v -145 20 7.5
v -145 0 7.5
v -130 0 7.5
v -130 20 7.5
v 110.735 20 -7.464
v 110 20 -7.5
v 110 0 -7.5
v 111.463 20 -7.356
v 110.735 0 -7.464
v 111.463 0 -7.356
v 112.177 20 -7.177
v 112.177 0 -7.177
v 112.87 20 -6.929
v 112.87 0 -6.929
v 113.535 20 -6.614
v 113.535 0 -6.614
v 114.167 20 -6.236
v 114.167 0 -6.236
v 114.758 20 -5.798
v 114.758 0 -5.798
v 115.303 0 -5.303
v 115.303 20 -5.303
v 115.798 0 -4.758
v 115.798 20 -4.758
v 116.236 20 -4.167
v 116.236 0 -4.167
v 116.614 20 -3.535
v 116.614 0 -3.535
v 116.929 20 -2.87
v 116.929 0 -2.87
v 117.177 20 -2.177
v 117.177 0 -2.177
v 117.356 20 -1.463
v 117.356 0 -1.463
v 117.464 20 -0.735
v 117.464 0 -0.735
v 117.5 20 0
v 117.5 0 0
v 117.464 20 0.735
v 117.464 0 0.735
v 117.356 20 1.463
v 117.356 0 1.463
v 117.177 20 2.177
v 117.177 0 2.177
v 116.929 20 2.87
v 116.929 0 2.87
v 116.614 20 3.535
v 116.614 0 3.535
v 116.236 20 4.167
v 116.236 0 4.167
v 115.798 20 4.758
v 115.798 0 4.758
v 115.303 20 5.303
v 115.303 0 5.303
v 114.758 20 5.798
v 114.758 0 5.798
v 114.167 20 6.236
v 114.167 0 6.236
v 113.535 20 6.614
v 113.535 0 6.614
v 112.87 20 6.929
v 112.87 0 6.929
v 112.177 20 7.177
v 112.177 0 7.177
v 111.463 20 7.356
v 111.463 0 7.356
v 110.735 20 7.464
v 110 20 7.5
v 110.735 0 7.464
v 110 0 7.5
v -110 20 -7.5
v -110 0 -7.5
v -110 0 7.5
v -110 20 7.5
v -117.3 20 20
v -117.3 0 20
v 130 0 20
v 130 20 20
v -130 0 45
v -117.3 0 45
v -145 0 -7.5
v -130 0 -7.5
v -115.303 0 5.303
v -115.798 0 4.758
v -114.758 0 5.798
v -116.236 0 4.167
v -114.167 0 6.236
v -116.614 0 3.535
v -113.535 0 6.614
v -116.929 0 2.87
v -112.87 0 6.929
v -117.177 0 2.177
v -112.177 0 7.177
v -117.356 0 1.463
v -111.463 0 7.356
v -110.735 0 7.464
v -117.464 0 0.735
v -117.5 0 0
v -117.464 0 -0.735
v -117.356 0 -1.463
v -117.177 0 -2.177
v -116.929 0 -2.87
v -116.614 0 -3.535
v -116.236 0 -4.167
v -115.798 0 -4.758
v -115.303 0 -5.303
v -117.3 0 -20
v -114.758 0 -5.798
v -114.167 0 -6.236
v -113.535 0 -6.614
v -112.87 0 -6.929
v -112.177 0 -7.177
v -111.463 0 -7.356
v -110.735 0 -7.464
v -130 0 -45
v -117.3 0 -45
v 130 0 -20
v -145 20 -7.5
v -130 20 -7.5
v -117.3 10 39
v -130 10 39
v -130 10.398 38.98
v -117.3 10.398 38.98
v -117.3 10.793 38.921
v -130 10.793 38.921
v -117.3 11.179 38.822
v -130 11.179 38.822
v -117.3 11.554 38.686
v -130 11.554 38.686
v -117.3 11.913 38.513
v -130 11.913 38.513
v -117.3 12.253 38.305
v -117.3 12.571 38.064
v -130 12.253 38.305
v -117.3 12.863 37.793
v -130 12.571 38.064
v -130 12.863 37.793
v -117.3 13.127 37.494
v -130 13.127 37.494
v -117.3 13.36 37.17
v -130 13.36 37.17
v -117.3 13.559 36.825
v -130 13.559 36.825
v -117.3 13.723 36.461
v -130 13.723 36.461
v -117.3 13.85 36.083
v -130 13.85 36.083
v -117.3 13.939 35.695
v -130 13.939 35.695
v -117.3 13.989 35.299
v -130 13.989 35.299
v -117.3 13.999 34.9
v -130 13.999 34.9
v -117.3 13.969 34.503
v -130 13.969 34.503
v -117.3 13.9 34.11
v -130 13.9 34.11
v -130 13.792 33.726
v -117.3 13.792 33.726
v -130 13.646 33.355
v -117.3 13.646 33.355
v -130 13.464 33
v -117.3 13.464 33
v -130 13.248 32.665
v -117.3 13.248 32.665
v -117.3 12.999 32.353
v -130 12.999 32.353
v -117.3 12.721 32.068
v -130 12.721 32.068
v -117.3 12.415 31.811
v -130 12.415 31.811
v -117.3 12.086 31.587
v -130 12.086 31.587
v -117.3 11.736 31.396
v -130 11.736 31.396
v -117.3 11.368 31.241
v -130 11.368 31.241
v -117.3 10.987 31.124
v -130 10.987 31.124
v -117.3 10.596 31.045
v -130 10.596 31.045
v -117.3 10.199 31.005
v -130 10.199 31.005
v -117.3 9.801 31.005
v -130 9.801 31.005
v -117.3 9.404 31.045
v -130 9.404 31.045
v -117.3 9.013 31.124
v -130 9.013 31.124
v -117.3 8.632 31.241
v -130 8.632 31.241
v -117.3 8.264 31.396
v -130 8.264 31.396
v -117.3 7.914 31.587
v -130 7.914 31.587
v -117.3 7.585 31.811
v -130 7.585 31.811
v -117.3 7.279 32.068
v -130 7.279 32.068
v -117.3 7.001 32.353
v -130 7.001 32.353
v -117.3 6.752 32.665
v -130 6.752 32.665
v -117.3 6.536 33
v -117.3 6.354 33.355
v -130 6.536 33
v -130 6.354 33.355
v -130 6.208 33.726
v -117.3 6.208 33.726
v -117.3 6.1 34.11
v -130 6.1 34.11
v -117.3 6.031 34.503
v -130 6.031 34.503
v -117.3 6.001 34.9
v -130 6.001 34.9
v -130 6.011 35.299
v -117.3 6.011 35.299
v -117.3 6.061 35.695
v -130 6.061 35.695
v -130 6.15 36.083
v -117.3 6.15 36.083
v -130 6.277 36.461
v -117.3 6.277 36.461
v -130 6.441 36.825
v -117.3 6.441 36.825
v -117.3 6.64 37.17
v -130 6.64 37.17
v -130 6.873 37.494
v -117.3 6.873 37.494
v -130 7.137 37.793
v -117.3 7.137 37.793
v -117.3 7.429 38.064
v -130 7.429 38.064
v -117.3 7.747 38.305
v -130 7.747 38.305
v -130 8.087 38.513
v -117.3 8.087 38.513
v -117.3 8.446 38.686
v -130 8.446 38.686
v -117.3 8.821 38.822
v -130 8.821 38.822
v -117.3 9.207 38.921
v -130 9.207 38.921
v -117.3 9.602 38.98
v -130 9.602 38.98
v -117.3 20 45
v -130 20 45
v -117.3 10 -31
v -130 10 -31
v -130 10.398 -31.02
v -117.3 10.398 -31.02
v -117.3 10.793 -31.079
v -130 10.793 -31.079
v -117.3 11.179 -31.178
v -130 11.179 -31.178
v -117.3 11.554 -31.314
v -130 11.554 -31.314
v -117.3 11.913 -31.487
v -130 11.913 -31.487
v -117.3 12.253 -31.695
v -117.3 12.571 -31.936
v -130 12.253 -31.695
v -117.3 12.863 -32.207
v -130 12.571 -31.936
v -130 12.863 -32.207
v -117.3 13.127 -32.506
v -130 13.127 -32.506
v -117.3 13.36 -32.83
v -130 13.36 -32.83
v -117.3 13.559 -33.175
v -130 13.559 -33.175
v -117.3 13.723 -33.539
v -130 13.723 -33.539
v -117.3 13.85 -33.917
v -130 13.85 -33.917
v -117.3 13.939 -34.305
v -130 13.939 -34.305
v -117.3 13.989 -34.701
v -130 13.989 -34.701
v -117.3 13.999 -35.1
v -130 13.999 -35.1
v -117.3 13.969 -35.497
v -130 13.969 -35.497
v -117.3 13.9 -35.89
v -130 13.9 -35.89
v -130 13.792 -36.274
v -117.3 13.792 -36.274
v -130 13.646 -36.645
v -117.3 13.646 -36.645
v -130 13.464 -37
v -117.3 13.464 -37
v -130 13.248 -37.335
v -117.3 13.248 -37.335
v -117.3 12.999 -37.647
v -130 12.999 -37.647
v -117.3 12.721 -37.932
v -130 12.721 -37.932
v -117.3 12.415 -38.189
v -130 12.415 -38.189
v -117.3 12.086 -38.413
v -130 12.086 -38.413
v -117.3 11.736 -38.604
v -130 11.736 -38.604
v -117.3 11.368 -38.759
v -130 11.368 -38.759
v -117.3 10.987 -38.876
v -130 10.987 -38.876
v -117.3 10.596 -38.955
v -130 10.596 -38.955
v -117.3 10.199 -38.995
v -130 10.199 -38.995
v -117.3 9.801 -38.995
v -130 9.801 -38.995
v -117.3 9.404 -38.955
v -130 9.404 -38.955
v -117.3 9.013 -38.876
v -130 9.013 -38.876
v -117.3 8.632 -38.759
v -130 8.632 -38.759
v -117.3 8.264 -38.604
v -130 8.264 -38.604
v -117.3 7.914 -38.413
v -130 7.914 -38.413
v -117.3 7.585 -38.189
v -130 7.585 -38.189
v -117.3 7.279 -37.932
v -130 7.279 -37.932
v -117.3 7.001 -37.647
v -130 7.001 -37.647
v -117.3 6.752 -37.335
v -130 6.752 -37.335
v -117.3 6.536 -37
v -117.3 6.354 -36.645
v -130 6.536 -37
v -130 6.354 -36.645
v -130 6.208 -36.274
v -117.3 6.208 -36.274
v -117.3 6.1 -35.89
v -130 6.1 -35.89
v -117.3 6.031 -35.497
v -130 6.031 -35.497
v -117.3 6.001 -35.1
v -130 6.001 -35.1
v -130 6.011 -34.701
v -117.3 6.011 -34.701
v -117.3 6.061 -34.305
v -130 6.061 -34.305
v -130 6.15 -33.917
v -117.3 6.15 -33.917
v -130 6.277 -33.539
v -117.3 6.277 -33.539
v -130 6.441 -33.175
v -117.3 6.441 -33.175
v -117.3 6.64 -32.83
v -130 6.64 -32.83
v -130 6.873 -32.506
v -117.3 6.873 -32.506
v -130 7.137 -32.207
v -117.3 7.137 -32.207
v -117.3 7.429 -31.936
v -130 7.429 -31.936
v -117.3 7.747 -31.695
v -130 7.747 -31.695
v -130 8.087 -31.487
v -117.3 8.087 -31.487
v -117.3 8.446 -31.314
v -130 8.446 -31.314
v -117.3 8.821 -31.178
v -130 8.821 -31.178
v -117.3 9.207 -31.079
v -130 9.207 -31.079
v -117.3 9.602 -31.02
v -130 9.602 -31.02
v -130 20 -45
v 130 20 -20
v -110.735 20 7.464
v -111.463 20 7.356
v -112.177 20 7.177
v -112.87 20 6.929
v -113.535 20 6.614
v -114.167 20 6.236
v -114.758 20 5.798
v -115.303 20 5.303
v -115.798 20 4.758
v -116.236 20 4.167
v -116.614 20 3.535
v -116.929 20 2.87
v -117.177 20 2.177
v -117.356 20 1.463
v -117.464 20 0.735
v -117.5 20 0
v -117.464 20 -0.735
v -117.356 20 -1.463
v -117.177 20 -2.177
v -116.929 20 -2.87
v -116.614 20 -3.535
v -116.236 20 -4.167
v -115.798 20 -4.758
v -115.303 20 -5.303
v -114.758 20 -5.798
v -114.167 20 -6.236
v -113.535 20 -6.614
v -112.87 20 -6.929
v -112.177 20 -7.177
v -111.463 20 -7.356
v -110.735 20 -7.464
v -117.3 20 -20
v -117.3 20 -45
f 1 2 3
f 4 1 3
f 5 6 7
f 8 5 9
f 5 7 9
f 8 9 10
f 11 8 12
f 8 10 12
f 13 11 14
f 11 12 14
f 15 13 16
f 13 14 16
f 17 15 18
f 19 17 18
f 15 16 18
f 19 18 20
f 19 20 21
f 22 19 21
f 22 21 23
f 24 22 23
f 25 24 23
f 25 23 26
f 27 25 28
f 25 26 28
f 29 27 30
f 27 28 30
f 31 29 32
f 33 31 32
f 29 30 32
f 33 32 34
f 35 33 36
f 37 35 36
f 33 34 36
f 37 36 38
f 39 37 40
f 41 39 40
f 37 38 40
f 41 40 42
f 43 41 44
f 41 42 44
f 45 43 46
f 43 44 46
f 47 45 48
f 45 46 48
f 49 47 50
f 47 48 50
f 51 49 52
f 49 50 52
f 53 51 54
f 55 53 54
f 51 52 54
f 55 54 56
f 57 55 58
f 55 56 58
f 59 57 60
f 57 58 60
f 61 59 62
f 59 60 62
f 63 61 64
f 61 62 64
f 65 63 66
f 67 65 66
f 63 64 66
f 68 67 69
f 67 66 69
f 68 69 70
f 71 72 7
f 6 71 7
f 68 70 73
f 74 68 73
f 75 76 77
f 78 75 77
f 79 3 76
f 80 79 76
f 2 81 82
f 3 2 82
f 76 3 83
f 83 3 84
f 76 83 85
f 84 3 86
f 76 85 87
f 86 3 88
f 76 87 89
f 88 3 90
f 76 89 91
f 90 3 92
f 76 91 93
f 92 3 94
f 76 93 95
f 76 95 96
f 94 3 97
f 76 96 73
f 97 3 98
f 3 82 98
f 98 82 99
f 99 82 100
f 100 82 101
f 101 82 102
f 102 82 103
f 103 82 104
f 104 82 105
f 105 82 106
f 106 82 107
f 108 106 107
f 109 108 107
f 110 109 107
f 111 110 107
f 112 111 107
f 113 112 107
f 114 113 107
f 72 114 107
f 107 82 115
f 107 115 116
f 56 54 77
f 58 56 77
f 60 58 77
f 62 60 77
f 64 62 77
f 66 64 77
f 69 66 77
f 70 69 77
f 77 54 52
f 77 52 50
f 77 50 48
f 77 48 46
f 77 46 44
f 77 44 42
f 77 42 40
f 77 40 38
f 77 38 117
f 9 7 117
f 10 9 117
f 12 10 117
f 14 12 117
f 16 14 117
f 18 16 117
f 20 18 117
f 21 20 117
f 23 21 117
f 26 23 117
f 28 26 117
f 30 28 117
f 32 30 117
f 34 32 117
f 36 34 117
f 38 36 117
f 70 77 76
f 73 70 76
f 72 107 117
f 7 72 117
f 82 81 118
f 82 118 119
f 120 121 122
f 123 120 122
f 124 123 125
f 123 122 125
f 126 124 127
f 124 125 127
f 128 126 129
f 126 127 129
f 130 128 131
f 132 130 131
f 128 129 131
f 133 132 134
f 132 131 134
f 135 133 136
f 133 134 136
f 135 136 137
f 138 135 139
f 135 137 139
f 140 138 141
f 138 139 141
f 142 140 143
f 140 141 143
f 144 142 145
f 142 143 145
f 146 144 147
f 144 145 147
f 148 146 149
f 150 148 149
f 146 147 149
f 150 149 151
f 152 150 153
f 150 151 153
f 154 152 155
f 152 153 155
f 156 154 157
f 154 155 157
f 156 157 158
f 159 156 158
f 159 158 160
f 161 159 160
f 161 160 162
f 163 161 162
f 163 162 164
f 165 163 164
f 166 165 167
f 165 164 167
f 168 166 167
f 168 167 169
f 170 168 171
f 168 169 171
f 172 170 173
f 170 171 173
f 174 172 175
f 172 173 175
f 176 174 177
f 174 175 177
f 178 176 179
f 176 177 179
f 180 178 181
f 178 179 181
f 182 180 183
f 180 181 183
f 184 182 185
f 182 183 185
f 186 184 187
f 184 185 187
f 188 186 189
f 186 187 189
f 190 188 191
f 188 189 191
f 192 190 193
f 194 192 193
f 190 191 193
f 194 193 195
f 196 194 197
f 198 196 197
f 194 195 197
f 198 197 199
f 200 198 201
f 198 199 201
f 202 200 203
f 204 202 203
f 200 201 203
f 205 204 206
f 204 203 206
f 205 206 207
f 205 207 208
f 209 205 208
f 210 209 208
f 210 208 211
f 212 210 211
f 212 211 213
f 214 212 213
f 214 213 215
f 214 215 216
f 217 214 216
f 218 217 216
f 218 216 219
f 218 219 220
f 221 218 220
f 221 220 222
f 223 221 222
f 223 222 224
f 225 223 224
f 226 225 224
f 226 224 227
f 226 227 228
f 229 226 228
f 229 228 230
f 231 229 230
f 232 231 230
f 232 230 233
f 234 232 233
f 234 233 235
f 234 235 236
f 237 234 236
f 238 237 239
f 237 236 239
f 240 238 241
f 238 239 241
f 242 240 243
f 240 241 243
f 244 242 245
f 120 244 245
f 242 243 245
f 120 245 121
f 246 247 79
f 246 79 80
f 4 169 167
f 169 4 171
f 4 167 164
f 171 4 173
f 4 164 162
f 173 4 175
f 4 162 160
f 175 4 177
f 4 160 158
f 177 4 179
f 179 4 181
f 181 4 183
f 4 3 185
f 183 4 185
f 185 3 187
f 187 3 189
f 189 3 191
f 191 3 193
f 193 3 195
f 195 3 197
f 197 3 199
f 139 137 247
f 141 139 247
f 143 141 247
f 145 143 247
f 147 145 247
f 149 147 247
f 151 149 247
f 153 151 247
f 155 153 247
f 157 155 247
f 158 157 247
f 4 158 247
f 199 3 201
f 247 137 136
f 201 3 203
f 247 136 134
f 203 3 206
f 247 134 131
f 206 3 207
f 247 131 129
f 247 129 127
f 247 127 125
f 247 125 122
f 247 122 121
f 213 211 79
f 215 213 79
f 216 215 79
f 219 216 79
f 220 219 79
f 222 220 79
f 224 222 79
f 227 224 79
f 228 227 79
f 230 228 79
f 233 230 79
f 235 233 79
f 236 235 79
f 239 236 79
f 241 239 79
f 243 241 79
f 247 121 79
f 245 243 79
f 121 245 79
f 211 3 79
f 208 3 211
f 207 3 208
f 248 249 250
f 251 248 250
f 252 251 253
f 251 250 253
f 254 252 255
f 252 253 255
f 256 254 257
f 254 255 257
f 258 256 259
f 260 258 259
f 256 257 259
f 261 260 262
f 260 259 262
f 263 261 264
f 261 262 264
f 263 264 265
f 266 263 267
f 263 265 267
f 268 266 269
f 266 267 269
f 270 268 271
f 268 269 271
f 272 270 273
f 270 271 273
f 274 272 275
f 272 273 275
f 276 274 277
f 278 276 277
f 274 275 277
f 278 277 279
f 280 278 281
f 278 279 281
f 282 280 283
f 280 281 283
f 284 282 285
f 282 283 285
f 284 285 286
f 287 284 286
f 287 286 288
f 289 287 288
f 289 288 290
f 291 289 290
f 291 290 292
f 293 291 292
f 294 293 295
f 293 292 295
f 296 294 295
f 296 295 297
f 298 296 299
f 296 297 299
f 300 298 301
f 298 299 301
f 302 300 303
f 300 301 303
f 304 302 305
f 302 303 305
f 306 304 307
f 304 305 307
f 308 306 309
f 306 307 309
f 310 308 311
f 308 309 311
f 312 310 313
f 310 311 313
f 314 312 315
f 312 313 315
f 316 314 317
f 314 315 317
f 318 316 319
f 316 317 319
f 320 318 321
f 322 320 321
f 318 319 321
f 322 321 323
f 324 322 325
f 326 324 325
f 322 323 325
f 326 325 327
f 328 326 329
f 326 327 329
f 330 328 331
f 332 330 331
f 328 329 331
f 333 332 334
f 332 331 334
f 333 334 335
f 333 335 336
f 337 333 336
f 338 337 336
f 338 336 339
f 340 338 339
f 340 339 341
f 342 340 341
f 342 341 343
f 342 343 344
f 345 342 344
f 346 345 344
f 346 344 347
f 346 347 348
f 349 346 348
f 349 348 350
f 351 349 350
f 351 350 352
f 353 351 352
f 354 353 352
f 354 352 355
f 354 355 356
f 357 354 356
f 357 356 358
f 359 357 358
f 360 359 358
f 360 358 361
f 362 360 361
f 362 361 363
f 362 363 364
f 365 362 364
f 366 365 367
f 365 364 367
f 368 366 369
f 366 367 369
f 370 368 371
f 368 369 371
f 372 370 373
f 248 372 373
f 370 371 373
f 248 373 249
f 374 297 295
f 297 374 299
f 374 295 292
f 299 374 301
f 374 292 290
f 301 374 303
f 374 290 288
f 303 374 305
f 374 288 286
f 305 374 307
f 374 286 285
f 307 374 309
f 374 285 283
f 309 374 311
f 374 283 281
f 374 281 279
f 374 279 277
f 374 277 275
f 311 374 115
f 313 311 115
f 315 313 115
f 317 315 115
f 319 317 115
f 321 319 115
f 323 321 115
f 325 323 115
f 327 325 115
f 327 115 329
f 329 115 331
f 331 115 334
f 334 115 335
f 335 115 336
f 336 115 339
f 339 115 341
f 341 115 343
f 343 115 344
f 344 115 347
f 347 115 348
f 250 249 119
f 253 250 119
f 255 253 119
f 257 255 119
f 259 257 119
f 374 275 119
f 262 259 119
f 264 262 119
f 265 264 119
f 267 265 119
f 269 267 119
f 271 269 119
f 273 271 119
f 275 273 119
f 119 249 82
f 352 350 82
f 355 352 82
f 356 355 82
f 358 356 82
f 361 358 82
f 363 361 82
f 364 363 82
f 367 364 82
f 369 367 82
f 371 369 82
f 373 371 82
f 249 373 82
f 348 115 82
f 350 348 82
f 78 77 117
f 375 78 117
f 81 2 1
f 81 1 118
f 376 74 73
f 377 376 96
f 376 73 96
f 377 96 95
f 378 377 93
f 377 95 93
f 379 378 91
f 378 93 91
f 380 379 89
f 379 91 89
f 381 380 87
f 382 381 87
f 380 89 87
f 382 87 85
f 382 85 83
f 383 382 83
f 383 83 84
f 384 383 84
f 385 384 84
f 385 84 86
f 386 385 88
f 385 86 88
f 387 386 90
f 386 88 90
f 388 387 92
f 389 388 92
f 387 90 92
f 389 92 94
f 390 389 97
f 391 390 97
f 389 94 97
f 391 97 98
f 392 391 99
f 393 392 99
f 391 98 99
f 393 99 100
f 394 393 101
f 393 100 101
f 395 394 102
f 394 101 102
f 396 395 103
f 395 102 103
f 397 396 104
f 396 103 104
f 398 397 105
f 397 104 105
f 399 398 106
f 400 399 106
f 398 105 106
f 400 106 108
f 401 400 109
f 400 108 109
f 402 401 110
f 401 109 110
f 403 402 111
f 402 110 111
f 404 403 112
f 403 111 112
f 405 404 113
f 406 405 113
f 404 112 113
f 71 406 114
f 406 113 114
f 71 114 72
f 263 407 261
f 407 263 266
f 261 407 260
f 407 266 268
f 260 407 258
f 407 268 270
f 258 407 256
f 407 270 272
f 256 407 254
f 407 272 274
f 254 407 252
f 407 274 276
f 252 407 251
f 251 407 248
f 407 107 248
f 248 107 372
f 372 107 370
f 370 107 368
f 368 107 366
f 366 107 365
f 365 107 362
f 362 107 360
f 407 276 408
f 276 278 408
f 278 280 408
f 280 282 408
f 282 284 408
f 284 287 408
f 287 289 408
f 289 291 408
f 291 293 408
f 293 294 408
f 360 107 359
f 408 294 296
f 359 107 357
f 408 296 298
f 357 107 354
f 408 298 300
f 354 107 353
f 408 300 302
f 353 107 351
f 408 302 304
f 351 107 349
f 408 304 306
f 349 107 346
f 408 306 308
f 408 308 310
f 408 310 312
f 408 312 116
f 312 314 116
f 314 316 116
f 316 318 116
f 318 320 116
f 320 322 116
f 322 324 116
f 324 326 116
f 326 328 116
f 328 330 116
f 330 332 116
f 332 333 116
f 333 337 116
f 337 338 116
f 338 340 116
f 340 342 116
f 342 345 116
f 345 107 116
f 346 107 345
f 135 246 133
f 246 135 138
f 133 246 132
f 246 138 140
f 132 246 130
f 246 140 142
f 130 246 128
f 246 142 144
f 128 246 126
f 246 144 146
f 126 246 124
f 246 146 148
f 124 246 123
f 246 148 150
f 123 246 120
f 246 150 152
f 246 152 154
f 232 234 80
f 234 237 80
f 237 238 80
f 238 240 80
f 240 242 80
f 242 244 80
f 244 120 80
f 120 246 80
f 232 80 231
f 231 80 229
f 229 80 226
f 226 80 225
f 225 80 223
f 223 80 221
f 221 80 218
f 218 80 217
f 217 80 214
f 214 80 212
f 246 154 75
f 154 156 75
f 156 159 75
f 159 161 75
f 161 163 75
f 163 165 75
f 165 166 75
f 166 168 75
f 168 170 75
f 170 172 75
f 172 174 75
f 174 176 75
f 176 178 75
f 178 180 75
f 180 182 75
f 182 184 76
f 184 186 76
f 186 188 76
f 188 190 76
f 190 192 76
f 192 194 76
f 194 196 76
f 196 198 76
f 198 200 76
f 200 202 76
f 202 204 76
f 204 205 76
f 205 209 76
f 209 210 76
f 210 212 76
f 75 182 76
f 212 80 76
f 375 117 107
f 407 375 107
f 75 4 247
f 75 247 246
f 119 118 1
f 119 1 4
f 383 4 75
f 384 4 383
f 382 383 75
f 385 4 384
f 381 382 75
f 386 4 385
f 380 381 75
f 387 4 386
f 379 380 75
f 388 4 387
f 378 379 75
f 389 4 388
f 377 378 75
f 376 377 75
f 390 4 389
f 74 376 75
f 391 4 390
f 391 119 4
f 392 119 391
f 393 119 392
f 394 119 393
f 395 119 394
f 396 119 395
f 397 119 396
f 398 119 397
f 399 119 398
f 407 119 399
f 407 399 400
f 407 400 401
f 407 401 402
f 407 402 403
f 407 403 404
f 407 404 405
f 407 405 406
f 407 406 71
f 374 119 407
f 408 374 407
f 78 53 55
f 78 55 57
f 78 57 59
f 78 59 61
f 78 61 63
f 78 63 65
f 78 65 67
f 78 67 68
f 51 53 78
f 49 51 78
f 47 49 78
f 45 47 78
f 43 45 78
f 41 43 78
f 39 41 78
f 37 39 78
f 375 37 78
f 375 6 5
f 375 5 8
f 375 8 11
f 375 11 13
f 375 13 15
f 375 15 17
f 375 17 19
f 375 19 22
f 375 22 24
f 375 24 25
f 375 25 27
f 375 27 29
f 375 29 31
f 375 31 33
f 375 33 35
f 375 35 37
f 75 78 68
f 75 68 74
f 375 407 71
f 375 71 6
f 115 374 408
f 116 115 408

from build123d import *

# Parameters (mm, degrees)
CROQUIS1_W              = 12.7
CROQUIS1_H              = 25
CROQUIS1_H_2            = 5
CROQUIS1_W_2            = 15
CROQUIS1_H_3            = 15
SALIENTE_EXTRUIR1_DEPTH = 20
CROQUIS2_R              = 4
CORTAR_EXTRUIR1_DEPTH   = 12.7


with BuildPart() as part:
    # Croquis1 → Saliente-Extruir1 (new body)
    # profile 1 of 6: a face of its own
    with BuildSketch(Plane(origin=(0, 0, 0), x_dir=(1, 0, 0), z_dir=(0, 1, 0))):
        Polygon((-117.3, -20), (130, -20), (130, 20), (-117.3, 20), (-117.3, 15), (-130, 15), (-130, 7.5), (-130, -7.5), (-130, -15), (-117.3, -15), align=None)
        with BuildLine():
            ThreePointArc((110, 7.5), (117.5, 0), (110, -7.5))
            Line((110, -7.5), (-110, -7.5))
            ThreePointArc((-110, -7.5), (-117.5, 0), (-110, 7.5))
            Line((-110, 7.5), (110, 7.5))
        make_face(mode=Mode.SUBTRACT)
    # profile 2 of 6: a face of its own
    with BuildSketch(Plane(origin=(0, 0, 0), x_dir=(1, 0, 0), z_dir=(0, 1, 0))):
        with Locations((-123.65, -32.5)):
            Rectangle(CROQUIS1_W, CROQUIS1_H)
    # profile 3 of 6: a face of its own
    with BuildSketch(Plane(origin=(0, 0, 0), x_dir=(1, 0, 0), z_dir=(0, 1, 0))):
        with Locations((-123.65, -17.5)):
            Rectangle(CROQUIS1_W, CROQUIS1_H_2)
    # profile 4 of 6: a face of its own
    with BuildSketch(Plane(origin=(0, 0, 0), x_dir=(1, 0, 0), z_dir=(0, 1, 0))):
        with Locations((-123.65, 17.5)):
            Rectangle(CROQUIS1_W, CROQUIS1_H_2)
    # profile 5 of 6: a face of its own
    with BuildSketch(Plane(origin=(0, 0, 0), x_dir=(1, 0, 0), z_dir=(0, 1, 0))):
        with Locations((-123.65, 32.5)):
            Rectangle(CROQUIS1_W, CROQUIS1_H)
    # profile 6 of 6: a face of its own
    with BuildSketch(Plane(origin=(0, 0, 0), x_dir=(1, 0, 0), z_dir=(0, 1, 0))):
        with Locations((-137.5, 0)):
            Rectangle(CROQUIS1_W_2, CROQUIS1_H_3)
    extrude(amount=SALIENTE_EXTRUIR1_DEPTH)

    # Croquis2 → Cortar-Extruir1 (cut)
    with BuildSketch(Plane.ZY.offset(130)):
        with Locations((-35, 10)):
            Circle(CROQUIS2_R)
        with Locations((35, 10)):
            Circle(CROQUIS2_R)
    extrude(amount=-CORTAR_EXTRUIR1_DEPTH, mode=Mode.SUBTRACT)


solid = part.part
